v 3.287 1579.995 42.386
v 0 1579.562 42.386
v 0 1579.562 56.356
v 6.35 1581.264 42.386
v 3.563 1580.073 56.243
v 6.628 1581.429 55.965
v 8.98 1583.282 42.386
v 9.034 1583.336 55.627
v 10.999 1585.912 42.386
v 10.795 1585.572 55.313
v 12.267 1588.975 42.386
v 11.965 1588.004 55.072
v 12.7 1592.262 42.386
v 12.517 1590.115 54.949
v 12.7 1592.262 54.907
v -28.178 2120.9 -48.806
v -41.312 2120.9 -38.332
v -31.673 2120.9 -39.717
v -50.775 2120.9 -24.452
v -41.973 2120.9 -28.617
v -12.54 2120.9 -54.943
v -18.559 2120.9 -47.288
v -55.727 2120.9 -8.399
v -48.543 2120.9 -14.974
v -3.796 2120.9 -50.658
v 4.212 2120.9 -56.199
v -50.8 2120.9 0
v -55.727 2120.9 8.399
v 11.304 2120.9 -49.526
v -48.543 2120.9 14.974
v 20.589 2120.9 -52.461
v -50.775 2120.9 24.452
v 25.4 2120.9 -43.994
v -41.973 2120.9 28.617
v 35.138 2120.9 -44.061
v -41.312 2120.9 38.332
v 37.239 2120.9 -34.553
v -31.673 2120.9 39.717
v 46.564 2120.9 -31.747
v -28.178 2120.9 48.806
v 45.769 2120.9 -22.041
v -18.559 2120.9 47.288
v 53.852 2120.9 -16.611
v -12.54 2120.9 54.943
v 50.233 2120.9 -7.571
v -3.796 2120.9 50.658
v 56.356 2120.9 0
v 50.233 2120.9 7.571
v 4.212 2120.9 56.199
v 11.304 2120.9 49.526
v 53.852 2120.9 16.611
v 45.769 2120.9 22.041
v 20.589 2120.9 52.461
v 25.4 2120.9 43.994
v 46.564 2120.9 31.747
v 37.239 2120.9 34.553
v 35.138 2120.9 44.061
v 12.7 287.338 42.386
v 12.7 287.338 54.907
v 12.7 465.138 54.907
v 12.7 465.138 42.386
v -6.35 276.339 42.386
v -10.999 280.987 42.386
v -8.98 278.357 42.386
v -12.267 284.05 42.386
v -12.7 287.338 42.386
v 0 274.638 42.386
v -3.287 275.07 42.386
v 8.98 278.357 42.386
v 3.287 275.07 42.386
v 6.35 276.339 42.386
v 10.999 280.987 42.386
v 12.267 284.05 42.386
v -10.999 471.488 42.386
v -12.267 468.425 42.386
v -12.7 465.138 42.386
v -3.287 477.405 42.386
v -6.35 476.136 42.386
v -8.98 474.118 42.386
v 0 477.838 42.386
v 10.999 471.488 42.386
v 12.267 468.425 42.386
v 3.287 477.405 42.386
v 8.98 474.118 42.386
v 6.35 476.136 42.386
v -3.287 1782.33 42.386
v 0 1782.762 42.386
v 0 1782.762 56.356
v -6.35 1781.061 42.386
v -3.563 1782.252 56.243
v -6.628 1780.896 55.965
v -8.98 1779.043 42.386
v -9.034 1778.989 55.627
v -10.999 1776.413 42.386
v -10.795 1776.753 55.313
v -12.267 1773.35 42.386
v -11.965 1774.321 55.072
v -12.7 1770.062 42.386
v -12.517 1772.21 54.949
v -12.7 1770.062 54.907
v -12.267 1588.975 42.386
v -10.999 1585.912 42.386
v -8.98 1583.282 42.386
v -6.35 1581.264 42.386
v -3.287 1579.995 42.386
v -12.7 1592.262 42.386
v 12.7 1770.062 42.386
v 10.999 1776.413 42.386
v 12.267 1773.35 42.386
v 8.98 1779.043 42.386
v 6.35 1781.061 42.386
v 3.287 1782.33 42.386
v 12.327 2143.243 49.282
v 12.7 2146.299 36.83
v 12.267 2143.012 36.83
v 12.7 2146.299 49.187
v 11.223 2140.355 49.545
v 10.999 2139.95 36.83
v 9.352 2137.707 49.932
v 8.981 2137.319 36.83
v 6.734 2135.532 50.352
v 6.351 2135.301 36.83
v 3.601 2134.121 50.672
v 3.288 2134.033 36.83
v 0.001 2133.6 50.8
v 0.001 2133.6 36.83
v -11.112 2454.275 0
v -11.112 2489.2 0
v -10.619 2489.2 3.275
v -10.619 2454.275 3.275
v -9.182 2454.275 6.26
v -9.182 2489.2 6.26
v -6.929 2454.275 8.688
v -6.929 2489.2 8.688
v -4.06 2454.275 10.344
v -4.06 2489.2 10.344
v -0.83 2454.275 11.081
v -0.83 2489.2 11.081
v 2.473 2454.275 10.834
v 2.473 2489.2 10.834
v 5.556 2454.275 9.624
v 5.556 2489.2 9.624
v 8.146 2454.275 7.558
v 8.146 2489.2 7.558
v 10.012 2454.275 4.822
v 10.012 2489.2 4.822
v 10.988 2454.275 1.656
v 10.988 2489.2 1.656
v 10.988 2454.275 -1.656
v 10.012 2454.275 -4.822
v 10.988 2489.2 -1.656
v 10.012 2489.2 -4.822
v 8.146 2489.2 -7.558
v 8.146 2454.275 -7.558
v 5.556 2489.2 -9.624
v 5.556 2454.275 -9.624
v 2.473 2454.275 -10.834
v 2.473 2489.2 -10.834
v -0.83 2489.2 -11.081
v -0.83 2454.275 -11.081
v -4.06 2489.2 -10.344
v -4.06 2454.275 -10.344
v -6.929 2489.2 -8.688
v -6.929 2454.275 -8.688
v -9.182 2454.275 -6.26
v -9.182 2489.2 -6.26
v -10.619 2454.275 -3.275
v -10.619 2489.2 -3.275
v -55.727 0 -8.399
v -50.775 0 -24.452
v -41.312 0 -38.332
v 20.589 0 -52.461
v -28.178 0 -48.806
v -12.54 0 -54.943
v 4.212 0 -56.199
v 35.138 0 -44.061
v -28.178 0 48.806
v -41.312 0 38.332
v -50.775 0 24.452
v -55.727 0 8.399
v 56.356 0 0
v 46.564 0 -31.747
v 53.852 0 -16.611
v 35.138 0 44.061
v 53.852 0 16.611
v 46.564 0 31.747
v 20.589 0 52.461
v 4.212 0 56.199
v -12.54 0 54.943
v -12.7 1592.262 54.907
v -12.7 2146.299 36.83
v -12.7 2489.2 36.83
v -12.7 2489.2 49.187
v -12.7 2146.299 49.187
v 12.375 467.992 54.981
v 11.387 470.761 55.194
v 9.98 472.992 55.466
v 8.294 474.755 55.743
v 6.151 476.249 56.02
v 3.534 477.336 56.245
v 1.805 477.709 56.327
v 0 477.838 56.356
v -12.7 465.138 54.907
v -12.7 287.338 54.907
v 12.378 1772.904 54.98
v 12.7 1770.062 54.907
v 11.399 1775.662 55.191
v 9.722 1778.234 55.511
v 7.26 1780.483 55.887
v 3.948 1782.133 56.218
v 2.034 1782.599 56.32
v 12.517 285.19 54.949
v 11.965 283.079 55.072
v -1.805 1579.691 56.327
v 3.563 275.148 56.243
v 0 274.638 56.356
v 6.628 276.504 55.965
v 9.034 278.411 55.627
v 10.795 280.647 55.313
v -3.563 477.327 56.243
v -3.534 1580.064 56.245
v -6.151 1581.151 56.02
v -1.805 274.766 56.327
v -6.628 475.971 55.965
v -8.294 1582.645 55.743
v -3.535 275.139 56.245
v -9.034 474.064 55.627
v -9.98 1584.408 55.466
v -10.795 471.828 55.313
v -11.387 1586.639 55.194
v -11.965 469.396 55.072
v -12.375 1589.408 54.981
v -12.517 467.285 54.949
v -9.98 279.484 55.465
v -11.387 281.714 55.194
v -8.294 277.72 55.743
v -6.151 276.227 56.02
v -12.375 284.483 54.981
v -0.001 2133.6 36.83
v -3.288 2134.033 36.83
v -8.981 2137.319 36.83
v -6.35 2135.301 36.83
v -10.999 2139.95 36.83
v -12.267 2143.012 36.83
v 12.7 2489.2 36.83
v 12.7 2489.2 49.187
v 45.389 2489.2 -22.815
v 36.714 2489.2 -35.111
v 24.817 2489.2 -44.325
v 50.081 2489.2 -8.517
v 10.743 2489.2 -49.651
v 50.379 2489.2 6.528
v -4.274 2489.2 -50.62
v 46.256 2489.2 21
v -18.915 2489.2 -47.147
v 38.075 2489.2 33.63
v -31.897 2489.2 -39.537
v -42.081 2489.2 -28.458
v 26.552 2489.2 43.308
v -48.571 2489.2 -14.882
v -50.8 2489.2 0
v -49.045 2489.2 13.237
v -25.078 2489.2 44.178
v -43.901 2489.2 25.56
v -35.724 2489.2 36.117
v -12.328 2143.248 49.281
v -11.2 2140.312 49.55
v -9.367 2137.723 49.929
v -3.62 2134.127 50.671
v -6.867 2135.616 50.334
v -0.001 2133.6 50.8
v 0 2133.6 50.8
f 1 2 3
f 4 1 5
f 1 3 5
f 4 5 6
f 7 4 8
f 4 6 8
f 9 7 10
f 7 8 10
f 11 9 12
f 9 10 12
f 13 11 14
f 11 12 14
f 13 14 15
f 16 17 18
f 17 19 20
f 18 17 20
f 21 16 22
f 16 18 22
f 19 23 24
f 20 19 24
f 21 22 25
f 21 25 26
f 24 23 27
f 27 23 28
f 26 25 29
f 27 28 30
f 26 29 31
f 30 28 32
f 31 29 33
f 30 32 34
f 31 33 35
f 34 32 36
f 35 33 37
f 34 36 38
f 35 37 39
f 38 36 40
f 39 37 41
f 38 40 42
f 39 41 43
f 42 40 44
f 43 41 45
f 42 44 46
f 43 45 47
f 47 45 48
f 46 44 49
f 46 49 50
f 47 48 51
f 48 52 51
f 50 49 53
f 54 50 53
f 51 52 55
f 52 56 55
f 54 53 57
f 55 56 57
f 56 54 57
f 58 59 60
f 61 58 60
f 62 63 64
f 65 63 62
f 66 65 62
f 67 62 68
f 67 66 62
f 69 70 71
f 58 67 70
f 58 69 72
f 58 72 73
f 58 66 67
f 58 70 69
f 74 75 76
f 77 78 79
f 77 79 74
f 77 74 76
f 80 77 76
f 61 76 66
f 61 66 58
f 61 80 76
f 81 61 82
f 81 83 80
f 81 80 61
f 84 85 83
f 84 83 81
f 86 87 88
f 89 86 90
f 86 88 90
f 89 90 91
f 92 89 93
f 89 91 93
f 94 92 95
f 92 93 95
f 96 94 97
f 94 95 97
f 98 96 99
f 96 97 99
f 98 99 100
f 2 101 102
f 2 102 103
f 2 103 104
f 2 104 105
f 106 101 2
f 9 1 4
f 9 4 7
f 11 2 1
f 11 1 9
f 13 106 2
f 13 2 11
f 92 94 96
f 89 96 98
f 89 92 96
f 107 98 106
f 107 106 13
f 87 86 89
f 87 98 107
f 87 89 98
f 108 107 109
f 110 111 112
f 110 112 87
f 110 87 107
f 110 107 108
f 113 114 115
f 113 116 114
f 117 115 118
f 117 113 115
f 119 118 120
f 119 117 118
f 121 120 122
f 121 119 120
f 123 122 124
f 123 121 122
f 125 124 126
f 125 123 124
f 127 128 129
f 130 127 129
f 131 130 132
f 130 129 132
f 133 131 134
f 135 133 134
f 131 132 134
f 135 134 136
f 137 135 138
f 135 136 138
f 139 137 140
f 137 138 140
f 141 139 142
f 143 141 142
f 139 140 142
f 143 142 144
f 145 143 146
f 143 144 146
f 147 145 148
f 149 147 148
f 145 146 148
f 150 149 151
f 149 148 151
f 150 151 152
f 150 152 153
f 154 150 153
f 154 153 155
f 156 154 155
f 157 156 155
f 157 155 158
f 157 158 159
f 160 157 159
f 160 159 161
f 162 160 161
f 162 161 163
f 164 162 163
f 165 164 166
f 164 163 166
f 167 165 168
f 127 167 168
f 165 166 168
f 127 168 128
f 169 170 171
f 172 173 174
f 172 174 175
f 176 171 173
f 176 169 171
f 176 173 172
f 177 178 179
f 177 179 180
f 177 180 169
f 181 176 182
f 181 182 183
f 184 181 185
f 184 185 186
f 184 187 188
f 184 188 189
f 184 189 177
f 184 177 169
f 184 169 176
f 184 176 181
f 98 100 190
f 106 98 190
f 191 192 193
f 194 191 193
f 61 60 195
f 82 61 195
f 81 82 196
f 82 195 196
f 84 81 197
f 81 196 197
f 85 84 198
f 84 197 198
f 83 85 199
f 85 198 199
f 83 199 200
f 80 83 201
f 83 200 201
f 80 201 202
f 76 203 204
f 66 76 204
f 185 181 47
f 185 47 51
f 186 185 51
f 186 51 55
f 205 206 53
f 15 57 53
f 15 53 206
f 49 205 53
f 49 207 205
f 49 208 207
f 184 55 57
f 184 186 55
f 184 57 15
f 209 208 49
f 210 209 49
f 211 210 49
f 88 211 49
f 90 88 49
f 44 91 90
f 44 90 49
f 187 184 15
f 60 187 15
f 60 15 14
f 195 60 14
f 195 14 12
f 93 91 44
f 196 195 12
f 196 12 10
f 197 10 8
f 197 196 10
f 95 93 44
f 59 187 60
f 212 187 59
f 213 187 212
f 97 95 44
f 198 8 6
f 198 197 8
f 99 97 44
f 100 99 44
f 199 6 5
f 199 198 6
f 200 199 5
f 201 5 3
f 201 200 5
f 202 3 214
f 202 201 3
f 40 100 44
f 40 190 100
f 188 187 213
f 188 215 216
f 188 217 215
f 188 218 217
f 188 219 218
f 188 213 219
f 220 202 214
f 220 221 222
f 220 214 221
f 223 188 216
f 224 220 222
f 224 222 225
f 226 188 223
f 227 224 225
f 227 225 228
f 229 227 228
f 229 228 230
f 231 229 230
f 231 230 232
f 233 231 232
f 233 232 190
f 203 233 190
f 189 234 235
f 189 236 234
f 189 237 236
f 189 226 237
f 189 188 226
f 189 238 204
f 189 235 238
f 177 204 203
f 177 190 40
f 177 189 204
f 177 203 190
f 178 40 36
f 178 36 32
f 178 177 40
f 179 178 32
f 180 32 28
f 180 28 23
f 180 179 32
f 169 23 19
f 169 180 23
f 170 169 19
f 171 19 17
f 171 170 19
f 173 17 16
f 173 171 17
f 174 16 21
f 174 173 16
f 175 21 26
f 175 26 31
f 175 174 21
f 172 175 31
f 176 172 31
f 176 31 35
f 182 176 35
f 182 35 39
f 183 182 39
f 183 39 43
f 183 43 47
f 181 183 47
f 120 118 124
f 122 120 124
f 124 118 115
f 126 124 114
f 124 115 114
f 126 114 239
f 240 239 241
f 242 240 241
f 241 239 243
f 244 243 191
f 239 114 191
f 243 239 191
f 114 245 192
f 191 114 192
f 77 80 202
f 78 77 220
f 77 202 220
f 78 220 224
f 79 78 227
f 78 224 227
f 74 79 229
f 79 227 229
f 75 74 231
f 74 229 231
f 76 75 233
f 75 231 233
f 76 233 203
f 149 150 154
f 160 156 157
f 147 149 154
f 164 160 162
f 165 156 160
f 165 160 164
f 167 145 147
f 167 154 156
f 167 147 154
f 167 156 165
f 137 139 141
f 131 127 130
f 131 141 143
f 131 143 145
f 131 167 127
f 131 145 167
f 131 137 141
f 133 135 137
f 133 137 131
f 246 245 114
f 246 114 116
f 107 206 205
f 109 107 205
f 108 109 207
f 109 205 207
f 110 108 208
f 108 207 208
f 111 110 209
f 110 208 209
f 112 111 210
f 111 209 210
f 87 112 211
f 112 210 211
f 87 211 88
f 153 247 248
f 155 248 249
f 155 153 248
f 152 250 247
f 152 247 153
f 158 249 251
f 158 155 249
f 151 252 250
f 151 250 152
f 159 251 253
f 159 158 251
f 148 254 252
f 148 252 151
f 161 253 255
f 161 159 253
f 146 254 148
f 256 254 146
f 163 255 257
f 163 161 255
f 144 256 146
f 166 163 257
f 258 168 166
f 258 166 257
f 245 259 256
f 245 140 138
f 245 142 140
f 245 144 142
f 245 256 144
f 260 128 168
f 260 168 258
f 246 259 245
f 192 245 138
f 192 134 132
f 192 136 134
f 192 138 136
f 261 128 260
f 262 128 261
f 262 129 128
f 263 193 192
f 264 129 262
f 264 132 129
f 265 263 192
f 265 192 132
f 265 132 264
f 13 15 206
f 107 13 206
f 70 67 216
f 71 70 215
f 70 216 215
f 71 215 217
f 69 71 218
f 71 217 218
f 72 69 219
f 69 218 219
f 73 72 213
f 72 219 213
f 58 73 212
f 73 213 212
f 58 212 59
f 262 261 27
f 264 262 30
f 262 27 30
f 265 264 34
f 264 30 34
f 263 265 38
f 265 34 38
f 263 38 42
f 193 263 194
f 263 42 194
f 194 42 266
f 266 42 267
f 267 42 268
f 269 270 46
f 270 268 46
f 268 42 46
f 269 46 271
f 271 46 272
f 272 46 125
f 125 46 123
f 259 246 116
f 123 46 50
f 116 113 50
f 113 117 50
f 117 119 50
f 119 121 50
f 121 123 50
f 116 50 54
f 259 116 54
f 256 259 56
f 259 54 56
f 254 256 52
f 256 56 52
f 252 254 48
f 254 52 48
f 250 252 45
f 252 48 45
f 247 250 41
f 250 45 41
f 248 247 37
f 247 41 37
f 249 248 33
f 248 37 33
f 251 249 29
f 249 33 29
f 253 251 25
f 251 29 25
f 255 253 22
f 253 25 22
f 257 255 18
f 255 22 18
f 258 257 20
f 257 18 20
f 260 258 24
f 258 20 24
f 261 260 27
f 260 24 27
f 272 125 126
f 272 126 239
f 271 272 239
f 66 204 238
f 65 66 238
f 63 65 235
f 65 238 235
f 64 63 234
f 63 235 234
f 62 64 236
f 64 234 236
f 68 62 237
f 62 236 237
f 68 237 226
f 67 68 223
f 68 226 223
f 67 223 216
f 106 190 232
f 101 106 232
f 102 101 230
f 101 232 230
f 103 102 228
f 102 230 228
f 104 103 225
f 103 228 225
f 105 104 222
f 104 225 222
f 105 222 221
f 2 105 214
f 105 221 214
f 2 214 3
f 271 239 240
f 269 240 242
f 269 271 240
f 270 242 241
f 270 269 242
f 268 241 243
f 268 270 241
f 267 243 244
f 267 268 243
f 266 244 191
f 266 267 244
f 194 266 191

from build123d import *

# Parameters (mm, degrees)
F0_R      = 56.35625
F1_DEPTH  = 2120.9
F2_R      = 50.8
F3_DEPTH  = 368.3
F4_R      = 11.1125
F5_DEPTH  = 34.925
F6_W      = 25.4
F6_H      = 25.4
F7_DEPTH  = 355.6
F8_R      = 12.699
F11_DEPTH = 13.97


# Not quite as in the source:
# - a fillet or chamfer is up to 0.001 mm smaller than in the source, because OpenCascade refuses the exact size


with BuildPart() as f1:
    # F0 (on Front) → F1 (new body)
    with BuildSketch(Plane.XZ):
        Circle(F0_R)
    extrude(amount=-F1_DEPTH)

    # F2 (on face) → F3 (join)
    with BuildSketch(Plane(origin=(0, 2120.9, 0), x_dir=(-1, 0, 0), z_dir=(0, 1, 0))):
        Circle(F2_R)
    extrude(amount=F3_DEPTH)

    # F4 (on face) → F5 (cut)
    with BuildSketch(Plane(origin=(0, 2489.2, 0), x_dir=(-1, 0, 0), z_dir=(0, 1, 0))):
        Circle(F4_R)
    extrude(amount=-F5_DEPTH, mode=Mode.SUBTRACT)

    # F6 (on face) → F7 (cut)
    with BuildSketch(Plane(origin=(0, 2489.2, 0), x_dir=(-1, 0, 0), z_dir=(0, 1, 0))):
        with Locations((0, 49.53)):
            Rectangle(F6_W, F6_H)
    extrude(amount=-F7_DEPTH, mode=Mode.SUBTRACT)

    # F8 (radius 12.7 in the source; OpenCascade refuses exactly that, so slightly less here)
    f8_edges = [f1.edges().sort_by_distance(p)[0] for p in [
        (12.7, 2133.6, 43.008444),
        (-12.7, 2133.6, 43.008444),
    ]]
    fillet(f8_edges, radius=F8_R)

    # F10 (on offset) → F11 (cut)
    with BuildSketch(Plane.XY.offset(56.35625)):
        with BuildLine():
            ThreePointArc((0, 477.8375), (-8.9802561211, 474.1177561211), (-12.7, 465.1375))
            Line((-12.7, 465.1375), (-12.7, 287.3375))
            ThreePointArc((-12.7, 287.3375), (-8.9802561211, 278.3572438789), (0, 274.6375))
            ThreePointArc((0, 274.6375), (8.9802561211, 278.3572438789), (12.7, 287.3375))
            Line((12.7, 287.3375), (12.7, 465.1375))
            ThreePointArc((12.7, 465.1375), (8.9802561211, 474.1177561211), (0, 477.8375))
        make_face()
        with BuildLine():
            ThreePointArc((0, 1782.7625), (-8.9802561211, 1779.0427561211), (-12.7, 1770.0625))
            Line((-12.7, 1770.0625), (-12.7, 1592.2625))
            ThreePointArc((-12.7, 1592.2625), (-8.9802561211, 1583.2822438789), (0, 1579.5625))
            ThreePointArc((0, 1579.5625), (8.9802561211, 1583.2822438789), (12.7, 1592.2625))
            Line((12.7, 1592.2625), (12.7, 1770.0625))
            ThreePointArc((12.7, 1770.0625), (8.9802561211, 1779.0427561211), (0, 1782.7625))
        make_face()
    extrude(amount=-F11_DEPTH, mode=Mode.SUBTRACT)


solid = f1.part
